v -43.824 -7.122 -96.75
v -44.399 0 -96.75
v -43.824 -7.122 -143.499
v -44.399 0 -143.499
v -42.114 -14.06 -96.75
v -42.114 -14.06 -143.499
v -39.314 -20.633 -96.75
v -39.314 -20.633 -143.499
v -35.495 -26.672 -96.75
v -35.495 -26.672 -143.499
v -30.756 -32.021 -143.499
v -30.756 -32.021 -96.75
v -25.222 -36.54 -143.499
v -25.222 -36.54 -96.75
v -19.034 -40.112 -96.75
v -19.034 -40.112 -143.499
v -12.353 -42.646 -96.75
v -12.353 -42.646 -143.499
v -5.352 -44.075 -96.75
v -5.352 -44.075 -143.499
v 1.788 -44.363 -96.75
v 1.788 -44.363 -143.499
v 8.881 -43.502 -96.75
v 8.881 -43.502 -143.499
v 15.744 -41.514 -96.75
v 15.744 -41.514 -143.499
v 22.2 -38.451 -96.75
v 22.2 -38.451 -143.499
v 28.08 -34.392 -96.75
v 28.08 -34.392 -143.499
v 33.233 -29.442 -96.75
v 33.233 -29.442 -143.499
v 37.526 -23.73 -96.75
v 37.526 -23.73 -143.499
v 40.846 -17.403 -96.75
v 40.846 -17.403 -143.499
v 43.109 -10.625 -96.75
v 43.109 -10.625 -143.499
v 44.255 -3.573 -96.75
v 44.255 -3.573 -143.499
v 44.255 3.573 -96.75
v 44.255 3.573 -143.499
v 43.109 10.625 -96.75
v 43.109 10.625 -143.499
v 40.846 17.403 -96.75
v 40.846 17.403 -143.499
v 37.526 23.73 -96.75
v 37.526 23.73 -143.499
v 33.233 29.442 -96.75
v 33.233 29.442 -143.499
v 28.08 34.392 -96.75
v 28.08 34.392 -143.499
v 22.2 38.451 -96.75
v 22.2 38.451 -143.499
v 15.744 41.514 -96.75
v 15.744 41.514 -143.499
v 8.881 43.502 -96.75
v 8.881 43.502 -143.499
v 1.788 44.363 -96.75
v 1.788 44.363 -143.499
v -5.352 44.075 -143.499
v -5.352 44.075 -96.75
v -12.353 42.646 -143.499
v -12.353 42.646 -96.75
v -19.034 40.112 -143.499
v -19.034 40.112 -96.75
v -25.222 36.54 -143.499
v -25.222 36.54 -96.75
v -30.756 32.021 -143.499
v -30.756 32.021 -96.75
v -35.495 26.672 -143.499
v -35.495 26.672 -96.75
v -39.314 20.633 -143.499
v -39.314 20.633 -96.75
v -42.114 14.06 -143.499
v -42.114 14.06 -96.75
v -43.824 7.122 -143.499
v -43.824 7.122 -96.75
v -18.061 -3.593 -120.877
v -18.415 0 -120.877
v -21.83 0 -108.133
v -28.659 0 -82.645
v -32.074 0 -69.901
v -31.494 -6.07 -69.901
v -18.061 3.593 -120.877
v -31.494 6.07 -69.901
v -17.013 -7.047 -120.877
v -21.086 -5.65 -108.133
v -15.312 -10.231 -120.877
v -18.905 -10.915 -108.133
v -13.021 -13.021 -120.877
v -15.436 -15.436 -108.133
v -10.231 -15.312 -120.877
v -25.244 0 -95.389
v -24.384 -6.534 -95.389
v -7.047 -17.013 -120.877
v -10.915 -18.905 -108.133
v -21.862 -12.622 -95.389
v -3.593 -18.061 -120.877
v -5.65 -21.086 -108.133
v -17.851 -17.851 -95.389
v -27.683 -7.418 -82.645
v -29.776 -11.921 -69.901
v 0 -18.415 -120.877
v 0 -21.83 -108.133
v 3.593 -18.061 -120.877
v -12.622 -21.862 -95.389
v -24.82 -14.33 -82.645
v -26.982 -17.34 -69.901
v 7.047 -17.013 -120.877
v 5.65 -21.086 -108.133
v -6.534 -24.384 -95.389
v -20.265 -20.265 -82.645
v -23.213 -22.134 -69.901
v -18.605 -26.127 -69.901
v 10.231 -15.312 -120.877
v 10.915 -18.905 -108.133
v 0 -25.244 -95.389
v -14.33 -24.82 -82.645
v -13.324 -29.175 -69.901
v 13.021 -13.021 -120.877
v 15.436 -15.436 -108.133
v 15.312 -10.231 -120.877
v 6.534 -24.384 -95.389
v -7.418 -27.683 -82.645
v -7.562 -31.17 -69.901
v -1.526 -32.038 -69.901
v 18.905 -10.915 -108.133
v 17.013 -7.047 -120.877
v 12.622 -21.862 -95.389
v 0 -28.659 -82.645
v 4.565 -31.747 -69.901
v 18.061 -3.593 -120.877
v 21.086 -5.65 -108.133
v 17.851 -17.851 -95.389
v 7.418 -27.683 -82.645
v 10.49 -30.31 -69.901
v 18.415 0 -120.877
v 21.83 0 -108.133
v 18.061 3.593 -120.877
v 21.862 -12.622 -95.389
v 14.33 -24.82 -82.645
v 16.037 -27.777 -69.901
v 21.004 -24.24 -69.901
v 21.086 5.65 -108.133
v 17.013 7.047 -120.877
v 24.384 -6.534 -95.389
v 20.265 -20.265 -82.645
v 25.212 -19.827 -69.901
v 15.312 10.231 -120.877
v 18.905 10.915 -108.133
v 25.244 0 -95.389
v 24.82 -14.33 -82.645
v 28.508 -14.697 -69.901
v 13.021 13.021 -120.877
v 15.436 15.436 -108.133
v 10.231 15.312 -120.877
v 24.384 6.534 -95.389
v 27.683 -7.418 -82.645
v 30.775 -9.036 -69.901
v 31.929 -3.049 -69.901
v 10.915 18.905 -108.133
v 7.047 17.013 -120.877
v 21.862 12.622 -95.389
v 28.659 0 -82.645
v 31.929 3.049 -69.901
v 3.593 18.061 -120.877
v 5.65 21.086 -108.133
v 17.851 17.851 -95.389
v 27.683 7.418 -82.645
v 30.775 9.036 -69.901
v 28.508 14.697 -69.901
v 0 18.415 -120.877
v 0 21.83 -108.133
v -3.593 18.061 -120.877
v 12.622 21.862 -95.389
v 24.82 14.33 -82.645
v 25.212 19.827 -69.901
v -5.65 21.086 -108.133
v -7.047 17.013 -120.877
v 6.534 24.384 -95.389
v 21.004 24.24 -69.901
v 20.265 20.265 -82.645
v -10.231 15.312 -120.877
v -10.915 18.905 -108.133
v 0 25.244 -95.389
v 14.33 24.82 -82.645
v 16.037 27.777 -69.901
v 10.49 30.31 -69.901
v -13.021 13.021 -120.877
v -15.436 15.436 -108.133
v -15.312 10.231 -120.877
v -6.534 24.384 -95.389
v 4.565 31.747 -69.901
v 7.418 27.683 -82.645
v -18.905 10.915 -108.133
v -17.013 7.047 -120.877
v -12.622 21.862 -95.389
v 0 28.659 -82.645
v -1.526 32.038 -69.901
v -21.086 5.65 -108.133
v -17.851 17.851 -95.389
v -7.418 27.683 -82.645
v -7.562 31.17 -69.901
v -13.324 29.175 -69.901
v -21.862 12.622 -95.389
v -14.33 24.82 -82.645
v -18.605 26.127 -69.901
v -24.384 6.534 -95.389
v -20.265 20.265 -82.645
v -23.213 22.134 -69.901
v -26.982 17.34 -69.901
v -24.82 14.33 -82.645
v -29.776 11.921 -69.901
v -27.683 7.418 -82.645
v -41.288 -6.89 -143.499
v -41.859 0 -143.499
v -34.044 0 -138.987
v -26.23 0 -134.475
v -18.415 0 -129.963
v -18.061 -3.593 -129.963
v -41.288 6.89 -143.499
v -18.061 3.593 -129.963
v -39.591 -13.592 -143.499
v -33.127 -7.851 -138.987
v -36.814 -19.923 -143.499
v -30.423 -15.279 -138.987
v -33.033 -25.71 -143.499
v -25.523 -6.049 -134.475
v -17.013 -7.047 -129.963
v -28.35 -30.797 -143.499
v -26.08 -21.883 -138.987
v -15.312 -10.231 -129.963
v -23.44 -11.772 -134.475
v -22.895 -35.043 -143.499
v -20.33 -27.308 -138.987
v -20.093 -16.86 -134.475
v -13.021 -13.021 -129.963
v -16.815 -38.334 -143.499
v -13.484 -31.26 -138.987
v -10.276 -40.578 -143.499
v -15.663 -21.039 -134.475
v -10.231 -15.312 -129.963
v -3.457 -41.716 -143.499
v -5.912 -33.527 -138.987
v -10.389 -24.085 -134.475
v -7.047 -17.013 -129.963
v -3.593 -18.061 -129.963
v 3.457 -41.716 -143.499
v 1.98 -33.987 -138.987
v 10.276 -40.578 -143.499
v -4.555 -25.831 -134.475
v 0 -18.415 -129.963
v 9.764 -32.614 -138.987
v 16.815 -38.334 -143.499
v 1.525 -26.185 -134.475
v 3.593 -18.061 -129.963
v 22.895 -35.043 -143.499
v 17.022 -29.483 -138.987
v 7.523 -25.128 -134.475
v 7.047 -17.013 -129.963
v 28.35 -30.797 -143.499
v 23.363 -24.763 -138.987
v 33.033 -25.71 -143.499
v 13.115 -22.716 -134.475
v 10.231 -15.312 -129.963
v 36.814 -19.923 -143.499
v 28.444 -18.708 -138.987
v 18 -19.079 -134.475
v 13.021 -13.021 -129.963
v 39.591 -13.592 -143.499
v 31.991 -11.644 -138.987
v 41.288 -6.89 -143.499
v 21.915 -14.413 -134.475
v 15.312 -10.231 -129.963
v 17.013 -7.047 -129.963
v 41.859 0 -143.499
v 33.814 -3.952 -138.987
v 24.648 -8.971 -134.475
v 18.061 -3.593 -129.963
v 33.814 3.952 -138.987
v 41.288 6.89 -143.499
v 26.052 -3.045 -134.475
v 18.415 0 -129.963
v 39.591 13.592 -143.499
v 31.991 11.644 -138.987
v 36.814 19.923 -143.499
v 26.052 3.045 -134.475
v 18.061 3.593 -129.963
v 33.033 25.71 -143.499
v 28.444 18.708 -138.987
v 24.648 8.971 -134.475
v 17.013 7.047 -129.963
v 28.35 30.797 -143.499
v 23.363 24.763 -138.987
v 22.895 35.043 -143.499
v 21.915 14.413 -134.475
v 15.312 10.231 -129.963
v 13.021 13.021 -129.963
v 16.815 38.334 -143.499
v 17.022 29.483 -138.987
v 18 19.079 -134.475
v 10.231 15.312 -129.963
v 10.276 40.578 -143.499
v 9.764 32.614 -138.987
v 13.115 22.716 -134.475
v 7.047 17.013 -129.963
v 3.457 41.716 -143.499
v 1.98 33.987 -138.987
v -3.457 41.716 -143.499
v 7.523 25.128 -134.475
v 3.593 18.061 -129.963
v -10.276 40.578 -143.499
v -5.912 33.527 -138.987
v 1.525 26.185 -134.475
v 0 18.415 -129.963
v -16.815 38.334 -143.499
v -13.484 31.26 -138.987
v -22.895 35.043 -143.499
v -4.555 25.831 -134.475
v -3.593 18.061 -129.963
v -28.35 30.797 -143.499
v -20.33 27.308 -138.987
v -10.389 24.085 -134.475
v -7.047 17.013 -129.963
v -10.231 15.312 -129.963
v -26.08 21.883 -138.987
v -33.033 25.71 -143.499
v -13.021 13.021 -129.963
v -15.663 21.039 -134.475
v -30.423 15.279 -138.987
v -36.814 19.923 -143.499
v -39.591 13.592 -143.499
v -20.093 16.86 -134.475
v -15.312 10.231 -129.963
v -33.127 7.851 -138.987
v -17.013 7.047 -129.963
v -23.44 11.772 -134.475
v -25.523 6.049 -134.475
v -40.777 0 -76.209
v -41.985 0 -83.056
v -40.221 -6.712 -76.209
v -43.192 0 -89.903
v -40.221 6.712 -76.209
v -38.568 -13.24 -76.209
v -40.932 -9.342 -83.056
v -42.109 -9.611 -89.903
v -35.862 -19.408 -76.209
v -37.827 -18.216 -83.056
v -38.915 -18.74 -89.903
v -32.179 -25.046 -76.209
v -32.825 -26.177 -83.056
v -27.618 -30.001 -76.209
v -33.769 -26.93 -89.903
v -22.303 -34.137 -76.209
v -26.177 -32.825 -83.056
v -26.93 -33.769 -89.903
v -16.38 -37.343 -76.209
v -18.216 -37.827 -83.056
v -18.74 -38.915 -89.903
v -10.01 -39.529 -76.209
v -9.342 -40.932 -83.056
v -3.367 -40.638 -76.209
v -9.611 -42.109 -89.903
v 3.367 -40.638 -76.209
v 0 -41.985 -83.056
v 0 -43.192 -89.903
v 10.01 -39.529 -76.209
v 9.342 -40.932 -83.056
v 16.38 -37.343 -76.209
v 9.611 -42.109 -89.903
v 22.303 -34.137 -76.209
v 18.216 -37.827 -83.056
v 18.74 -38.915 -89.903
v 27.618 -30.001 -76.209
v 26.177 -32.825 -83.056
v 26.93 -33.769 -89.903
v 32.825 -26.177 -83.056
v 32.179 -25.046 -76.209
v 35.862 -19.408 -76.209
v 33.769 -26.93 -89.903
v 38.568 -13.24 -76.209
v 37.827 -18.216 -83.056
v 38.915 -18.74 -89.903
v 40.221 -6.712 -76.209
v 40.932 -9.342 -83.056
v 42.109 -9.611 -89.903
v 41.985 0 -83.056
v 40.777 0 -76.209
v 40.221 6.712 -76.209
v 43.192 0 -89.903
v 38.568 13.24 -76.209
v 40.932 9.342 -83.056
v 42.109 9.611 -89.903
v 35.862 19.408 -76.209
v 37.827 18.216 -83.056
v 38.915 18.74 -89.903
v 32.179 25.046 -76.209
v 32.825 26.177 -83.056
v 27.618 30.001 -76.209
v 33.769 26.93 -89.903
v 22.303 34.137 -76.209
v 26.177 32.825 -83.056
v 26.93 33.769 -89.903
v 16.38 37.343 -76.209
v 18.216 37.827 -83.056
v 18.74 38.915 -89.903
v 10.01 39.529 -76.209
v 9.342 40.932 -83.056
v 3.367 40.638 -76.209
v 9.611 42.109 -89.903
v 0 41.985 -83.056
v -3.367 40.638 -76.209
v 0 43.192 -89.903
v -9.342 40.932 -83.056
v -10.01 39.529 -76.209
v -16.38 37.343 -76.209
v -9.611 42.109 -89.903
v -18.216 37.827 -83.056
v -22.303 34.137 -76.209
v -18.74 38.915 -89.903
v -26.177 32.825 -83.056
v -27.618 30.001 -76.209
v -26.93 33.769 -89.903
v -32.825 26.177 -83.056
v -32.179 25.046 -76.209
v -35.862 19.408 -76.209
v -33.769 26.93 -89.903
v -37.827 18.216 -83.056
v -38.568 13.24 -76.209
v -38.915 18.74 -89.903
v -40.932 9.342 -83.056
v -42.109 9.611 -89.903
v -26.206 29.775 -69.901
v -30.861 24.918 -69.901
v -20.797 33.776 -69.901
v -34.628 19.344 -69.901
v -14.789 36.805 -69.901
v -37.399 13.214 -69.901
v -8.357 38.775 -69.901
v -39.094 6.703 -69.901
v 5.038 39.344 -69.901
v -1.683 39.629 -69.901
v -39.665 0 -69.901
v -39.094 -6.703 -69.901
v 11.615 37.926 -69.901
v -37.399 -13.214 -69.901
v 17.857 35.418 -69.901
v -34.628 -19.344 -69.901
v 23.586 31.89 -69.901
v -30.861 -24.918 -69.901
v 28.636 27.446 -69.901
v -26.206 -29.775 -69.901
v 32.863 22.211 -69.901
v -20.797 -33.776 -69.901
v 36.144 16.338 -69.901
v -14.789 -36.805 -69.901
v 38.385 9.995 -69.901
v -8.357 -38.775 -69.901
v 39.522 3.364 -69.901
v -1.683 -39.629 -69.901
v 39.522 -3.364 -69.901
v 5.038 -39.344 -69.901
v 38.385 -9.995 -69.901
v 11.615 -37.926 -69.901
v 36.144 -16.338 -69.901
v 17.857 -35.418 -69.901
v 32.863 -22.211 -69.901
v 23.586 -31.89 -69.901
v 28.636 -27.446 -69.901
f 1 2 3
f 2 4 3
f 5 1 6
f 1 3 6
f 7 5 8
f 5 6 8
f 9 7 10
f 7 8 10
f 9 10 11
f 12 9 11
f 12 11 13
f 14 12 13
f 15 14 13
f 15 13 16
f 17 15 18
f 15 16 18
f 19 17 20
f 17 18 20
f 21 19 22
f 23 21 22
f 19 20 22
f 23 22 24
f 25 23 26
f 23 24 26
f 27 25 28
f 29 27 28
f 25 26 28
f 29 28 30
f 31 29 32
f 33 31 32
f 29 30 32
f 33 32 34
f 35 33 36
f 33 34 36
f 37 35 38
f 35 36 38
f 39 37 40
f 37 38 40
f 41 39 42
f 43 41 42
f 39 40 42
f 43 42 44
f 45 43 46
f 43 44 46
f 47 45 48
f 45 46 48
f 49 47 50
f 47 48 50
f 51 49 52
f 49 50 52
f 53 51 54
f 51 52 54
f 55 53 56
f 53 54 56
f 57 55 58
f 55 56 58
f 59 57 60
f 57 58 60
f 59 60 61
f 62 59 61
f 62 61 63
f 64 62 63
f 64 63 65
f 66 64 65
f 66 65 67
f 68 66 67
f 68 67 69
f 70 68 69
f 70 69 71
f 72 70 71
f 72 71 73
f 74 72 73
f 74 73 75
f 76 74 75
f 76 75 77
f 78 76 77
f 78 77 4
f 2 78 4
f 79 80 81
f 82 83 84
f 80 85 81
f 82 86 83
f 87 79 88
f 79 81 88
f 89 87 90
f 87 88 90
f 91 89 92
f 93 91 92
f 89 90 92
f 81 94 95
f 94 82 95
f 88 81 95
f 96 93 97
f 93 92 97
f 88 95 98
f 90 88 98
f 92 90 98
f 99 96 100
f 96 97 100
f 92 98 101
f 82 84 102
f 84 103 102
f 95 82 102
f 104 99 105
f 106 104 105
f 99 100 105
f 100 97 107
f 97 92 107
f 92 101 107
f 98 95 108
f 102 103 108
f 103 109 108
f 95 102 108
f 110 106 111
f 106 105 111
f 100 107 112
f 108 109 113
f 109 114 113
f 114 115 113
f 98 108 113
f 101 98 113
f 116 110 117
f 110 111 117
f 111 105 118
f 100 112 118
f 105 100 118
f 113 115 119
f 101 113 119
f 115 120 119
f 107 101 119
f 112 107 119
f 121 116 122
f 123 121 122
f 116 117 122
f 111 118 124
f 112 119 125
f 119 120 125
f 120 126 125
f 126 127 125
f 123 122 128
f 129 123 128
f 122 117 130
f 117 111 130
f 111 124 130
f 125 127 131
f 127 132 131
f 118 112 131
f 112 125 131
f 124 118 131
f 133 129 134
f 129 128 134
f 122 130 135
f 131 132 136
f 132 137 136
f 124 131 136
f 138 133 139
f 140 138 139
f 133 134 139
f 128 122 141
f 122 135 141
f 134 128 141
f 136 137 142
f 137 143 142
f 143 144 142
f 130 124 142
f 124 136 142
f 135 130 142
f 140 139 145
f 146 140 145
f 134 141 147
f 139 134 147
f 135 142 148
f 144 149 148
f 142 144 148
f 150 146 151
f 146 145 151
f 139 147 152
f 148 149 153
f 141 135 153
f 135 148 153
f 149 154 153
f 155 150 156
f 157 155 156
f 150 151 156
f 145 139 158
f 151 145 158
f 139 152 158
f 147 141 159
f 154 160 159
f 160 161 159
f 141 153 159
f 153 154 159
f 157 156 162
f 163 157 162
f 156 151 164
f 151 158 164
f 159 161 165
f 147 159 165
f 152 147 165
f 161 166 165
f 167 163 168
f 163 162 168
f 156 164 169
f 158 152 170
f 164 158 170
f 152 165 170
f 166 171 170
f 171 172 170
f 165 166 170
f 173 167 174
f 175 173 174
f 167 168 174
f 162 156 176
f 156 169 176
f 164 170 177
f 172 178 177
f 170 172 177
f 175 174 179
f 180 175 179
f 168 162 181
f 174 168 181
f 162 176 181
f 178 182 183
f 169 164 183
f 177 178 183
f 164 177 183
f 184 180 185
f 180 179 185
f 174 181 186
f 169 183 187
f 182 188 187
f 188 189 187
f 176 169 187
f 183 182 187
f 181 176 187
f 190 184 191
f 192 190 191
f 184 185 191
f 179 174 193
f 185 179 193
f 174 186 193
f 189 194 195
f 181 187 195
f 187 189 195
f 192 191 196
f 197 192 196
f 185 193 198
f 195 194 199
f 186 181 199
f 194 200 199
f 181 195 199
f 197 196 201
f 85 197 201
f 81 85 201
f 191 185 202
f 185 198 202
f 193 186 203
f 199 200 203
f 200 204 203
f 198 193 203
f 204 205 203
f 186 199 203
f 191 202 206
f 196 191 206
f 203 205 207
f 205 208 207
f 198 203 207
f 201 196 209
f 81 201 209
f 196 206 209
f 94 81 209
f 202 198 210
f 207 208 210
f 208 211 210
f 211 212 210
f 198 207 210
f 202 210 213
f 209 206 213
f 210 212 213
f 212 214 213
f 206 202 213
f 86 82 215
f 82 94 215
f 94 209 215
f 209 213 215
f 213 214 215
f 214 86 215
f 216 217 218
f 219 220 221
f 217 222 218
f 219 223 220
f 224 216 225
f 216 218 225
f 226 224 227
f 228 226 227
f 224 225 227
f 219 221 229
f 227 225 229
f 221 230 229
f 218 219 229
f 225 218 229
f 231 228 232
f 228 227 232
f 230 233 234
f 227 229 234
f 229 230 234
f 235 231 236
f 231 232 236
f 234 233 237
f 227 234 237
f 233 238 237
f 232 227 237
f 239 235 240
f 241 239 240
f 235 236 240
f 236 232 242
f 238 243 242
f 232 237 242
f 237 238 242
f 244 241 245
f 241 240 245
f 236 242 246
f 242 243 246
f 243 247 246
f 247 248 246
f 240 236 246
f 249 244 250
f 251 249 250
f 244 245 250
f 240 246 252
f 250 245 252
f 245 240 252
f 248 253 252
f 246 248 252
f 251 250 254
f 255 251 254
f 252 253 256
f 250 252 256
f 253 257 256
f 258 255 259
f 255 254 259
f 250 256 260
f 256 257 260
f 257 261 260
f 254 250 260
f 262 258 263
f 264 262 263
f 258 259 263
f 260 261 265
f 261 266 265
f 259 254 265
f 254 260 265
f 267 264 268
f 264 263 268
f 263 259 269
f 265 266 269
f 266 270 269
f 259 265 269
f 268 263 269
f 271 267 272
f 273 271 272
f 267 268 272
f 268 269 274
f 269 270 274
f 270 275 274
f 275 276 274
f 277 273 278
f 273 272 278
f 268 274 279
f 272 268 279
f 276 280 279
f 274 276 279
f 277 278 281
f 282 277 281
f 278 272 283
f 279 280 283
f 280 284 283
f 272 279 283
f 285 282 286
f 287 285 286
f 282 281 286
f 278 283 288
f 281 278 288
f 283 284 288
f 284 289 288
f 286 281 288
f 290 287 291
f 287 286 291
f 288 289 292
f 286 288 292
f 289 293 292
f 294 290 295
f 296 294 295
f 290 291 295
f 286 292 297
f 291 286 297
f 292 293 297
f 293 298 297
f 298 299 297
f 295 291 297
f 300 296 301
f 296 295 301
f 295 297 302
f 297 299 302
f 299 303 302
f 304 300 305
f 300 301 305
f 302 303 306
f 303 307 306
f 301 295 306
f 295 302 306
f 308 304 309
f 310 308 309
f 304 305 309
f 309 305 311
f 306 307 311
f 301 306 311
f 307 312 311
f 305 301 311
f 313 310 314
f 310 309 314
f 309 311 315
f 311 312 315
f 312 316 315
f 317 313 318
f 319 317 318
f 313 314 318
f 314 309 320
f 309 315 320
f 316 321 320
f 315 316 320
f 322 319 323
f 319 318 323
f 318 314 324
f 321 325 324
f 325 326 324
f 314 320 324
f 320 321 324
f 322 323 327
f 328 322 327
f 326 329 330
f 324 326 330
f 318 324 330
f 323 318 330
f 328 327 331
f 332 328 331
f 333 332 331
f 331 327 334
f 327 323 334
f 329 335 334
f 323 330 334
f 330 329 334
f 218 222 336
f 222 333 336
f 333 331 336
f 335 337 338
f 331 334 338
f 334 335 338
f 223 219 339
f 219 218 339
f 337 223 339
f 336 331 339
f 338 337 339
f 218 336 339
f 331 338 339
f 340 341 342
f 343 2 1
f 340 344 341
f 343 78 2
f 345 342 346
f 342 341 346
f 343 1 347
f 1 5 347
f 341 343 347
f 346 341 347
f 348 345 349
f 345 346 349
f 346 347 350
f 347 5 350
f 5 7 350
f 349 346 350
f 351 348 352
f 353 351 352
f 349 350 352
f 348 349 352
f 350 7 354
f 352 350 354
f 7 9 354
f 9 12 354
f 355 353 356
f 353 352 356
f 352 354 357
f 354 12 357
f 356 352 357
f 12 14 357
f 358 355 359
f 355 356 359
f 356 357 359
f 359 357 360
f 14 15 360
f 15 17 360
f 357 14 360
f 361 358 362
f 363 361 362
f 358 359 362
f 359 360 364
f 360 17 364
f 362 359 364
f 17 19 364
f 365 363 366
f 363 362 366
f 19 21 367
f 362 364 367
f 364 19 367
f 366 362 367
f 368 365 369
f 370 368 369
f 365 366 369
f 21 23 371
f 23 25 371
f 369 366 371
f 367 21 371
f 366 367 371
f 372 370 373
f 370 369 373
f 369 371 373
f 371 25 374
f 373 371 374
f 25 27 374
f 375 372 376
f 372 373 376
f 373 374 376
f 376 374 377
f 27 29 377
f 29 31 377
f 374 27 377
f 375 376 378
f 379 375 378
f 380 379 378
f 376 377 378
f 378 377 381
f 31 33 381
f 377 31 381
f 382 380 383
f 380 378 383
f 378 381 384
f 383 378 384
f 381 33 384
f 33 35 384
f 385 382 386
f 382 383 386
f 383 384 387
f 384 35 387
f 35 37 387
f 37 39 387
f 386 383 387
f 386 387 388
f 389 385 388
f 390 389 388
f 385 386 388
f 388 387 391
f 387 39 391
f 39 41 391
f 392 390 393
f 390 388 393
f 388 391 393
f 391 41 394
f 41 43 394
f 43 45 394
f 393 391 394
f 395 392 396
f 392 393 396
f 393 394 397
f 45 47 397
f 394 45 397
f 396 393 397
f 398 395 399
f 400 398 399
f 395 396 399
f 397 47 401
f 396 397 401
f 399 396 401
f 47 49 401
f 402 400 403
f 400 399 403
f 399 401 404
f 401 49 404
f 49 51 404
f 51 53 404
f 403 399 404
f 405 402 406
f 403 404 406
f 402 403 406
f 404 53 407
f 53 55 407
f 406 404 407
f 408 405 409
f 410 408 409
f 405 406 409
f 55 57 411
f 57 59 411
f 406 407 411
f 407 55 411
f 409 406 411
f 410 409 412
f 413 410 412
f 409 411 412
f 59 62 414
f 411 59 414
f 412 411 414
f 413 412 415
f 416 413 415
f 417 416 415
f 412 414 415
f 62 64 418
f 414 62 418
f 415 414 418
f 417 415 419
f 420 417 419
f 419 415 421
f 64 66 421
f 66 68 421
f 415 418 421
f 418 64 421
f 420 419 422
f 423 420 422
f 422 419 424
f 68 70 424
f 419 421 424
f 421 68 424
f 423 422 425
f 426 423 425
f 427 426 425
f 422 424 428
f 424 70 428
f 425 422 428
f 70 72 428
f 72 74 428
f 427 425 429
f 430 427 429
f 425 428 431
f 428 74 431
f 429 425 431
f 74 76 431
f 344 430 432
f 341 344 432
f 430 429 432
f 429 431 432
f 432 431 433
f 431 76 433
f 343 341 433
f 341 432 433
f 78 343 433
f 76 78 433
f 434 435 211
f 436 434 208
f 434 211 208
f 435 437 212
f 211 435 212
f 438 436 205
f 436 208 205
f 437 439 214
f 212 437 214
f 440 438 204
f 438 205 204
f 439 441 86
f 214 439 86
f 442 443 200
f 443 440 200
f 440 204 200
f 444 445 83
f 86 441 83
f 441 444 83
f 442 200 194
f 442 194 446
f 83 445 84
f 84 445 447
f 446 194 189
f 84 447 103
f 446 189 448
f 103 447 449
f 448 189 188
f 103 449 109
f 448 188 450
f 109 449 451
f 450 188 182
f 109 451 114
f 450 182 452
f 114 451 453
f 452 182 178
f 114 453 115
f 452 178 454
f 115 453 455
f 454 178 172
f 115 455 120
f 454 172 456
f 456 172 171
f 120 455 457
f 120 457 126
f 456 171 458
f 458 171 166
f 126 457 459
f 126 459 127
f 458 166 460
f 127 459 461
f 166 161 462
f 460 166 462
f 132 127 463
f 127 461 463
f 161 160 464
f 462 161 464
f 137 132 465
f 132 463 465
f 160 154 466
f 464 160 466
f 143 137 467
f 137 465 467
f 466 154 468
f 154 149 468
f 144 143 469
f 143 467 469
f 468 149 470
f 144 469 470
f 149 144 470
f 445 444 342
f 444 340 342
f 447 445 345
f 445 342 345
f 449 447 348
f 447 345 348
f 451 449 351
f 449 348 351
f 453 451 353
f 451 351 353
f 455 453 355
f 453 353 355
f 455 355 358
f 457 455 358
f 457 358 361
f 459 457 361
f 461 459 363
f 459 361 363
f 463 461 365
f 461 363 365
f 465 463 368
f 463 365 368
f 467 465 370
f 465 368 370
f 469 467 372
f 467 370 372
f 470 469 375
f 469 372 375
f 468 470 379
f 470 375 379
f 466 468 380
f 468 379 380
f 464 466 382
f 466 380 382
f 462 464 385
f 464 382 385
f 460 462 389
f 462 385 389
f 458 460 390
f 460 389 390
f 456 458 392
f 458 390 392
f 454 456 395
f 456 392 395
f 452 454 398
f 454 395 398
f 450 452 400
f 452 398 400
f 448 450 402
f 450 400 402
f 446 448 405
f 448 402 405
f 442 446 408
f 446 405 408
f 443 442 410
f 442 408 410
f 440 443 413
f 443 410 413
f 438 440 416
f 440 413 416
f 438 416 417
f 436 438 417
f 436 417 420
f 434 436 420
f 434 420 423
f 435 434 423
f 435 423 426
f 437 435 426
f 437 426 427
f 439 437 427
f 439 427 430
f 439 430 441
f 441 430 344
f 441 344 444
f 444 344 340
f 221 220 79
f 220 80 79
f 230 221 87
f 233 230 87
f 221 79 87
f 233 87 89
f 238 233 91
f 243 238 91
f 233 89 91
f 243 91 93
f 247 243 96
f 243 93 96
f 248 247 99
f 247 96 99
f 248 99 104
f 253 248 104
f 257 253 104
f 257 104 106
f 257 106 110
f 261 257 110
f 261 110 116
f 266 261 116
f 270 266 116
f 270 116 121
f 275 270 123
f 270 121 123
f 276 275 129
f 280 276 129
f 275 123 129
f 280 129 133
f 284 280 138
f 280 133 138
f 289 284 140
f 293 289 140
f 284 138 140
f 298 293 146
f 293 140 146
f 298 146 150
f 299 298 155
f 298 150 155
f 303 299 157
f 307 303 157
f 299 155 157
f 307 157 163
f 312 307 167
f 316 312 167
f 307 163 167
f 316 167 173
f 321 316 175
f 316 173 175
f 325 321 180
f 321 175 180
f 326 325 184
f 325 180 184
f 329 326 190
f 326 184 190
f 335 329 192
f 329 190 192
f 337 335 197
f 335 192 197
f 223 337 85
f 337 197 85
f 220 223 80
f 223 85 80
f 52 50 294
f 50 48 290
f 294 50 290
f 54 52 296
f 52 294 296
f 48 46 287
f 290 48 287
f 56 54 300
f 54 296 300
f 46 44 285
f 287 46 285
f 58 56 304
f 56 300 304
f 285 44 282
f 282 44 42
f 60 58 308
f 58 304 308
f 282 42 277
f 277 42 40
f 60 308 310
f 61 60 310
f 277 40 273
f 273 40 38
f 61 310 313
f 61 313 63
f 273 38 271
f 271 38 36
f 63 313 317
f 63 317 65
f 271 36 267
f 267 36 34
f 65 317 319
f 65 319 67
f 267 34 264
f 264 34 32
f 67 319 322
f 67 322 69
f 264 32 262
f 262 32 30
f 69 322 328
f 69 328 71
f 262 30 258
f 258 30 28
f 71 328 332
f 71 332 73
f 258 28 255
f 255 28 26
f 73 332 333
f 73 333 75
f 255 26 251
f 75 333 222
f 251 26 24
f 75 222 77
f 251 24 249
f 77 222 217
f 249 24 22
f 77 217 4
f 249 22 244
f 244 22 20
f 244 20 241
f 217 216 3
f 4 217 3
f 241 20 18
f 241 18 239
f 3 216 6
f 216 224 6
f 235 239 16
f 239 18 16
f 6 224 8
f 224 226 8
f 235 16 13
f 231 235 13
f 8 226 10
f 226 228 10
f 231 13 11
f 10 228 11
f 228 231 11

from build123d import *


with BuildPart() as part:
    # Sketch1 → Revolve1 (revolve)
    with BuildSketch(Plane(origin=(0, 0, 0), x_dir=(1, 0, 0), z_dir=(0, 1, 0)), mode=Mode.PRIVATE) as revolve1_sk:
        Polygon((18.415, 129.963013839), (18.415, 128.496544155), (44.3992, 143.49852902), (41.8592, 143.49852902), align=None)
        Polygon((44.3992, 96.750377662), (44.3992, 114.3), (44.3992, 143.49852902), (18.415, 128.496544155), (18.415, 120.876544155), (32.07390948, 69.9008), (39.664895038, 69.9008), (40.777169393, 76.208821327), align=None)
    revolve(revolve1_sk.sketch.rotate(Axis((0, 0, -147.178415471), (0, 0, 1)), 180), axis=Axis((0, 0, -147.178415471), (0, 0, 1)))


solid = part.part
